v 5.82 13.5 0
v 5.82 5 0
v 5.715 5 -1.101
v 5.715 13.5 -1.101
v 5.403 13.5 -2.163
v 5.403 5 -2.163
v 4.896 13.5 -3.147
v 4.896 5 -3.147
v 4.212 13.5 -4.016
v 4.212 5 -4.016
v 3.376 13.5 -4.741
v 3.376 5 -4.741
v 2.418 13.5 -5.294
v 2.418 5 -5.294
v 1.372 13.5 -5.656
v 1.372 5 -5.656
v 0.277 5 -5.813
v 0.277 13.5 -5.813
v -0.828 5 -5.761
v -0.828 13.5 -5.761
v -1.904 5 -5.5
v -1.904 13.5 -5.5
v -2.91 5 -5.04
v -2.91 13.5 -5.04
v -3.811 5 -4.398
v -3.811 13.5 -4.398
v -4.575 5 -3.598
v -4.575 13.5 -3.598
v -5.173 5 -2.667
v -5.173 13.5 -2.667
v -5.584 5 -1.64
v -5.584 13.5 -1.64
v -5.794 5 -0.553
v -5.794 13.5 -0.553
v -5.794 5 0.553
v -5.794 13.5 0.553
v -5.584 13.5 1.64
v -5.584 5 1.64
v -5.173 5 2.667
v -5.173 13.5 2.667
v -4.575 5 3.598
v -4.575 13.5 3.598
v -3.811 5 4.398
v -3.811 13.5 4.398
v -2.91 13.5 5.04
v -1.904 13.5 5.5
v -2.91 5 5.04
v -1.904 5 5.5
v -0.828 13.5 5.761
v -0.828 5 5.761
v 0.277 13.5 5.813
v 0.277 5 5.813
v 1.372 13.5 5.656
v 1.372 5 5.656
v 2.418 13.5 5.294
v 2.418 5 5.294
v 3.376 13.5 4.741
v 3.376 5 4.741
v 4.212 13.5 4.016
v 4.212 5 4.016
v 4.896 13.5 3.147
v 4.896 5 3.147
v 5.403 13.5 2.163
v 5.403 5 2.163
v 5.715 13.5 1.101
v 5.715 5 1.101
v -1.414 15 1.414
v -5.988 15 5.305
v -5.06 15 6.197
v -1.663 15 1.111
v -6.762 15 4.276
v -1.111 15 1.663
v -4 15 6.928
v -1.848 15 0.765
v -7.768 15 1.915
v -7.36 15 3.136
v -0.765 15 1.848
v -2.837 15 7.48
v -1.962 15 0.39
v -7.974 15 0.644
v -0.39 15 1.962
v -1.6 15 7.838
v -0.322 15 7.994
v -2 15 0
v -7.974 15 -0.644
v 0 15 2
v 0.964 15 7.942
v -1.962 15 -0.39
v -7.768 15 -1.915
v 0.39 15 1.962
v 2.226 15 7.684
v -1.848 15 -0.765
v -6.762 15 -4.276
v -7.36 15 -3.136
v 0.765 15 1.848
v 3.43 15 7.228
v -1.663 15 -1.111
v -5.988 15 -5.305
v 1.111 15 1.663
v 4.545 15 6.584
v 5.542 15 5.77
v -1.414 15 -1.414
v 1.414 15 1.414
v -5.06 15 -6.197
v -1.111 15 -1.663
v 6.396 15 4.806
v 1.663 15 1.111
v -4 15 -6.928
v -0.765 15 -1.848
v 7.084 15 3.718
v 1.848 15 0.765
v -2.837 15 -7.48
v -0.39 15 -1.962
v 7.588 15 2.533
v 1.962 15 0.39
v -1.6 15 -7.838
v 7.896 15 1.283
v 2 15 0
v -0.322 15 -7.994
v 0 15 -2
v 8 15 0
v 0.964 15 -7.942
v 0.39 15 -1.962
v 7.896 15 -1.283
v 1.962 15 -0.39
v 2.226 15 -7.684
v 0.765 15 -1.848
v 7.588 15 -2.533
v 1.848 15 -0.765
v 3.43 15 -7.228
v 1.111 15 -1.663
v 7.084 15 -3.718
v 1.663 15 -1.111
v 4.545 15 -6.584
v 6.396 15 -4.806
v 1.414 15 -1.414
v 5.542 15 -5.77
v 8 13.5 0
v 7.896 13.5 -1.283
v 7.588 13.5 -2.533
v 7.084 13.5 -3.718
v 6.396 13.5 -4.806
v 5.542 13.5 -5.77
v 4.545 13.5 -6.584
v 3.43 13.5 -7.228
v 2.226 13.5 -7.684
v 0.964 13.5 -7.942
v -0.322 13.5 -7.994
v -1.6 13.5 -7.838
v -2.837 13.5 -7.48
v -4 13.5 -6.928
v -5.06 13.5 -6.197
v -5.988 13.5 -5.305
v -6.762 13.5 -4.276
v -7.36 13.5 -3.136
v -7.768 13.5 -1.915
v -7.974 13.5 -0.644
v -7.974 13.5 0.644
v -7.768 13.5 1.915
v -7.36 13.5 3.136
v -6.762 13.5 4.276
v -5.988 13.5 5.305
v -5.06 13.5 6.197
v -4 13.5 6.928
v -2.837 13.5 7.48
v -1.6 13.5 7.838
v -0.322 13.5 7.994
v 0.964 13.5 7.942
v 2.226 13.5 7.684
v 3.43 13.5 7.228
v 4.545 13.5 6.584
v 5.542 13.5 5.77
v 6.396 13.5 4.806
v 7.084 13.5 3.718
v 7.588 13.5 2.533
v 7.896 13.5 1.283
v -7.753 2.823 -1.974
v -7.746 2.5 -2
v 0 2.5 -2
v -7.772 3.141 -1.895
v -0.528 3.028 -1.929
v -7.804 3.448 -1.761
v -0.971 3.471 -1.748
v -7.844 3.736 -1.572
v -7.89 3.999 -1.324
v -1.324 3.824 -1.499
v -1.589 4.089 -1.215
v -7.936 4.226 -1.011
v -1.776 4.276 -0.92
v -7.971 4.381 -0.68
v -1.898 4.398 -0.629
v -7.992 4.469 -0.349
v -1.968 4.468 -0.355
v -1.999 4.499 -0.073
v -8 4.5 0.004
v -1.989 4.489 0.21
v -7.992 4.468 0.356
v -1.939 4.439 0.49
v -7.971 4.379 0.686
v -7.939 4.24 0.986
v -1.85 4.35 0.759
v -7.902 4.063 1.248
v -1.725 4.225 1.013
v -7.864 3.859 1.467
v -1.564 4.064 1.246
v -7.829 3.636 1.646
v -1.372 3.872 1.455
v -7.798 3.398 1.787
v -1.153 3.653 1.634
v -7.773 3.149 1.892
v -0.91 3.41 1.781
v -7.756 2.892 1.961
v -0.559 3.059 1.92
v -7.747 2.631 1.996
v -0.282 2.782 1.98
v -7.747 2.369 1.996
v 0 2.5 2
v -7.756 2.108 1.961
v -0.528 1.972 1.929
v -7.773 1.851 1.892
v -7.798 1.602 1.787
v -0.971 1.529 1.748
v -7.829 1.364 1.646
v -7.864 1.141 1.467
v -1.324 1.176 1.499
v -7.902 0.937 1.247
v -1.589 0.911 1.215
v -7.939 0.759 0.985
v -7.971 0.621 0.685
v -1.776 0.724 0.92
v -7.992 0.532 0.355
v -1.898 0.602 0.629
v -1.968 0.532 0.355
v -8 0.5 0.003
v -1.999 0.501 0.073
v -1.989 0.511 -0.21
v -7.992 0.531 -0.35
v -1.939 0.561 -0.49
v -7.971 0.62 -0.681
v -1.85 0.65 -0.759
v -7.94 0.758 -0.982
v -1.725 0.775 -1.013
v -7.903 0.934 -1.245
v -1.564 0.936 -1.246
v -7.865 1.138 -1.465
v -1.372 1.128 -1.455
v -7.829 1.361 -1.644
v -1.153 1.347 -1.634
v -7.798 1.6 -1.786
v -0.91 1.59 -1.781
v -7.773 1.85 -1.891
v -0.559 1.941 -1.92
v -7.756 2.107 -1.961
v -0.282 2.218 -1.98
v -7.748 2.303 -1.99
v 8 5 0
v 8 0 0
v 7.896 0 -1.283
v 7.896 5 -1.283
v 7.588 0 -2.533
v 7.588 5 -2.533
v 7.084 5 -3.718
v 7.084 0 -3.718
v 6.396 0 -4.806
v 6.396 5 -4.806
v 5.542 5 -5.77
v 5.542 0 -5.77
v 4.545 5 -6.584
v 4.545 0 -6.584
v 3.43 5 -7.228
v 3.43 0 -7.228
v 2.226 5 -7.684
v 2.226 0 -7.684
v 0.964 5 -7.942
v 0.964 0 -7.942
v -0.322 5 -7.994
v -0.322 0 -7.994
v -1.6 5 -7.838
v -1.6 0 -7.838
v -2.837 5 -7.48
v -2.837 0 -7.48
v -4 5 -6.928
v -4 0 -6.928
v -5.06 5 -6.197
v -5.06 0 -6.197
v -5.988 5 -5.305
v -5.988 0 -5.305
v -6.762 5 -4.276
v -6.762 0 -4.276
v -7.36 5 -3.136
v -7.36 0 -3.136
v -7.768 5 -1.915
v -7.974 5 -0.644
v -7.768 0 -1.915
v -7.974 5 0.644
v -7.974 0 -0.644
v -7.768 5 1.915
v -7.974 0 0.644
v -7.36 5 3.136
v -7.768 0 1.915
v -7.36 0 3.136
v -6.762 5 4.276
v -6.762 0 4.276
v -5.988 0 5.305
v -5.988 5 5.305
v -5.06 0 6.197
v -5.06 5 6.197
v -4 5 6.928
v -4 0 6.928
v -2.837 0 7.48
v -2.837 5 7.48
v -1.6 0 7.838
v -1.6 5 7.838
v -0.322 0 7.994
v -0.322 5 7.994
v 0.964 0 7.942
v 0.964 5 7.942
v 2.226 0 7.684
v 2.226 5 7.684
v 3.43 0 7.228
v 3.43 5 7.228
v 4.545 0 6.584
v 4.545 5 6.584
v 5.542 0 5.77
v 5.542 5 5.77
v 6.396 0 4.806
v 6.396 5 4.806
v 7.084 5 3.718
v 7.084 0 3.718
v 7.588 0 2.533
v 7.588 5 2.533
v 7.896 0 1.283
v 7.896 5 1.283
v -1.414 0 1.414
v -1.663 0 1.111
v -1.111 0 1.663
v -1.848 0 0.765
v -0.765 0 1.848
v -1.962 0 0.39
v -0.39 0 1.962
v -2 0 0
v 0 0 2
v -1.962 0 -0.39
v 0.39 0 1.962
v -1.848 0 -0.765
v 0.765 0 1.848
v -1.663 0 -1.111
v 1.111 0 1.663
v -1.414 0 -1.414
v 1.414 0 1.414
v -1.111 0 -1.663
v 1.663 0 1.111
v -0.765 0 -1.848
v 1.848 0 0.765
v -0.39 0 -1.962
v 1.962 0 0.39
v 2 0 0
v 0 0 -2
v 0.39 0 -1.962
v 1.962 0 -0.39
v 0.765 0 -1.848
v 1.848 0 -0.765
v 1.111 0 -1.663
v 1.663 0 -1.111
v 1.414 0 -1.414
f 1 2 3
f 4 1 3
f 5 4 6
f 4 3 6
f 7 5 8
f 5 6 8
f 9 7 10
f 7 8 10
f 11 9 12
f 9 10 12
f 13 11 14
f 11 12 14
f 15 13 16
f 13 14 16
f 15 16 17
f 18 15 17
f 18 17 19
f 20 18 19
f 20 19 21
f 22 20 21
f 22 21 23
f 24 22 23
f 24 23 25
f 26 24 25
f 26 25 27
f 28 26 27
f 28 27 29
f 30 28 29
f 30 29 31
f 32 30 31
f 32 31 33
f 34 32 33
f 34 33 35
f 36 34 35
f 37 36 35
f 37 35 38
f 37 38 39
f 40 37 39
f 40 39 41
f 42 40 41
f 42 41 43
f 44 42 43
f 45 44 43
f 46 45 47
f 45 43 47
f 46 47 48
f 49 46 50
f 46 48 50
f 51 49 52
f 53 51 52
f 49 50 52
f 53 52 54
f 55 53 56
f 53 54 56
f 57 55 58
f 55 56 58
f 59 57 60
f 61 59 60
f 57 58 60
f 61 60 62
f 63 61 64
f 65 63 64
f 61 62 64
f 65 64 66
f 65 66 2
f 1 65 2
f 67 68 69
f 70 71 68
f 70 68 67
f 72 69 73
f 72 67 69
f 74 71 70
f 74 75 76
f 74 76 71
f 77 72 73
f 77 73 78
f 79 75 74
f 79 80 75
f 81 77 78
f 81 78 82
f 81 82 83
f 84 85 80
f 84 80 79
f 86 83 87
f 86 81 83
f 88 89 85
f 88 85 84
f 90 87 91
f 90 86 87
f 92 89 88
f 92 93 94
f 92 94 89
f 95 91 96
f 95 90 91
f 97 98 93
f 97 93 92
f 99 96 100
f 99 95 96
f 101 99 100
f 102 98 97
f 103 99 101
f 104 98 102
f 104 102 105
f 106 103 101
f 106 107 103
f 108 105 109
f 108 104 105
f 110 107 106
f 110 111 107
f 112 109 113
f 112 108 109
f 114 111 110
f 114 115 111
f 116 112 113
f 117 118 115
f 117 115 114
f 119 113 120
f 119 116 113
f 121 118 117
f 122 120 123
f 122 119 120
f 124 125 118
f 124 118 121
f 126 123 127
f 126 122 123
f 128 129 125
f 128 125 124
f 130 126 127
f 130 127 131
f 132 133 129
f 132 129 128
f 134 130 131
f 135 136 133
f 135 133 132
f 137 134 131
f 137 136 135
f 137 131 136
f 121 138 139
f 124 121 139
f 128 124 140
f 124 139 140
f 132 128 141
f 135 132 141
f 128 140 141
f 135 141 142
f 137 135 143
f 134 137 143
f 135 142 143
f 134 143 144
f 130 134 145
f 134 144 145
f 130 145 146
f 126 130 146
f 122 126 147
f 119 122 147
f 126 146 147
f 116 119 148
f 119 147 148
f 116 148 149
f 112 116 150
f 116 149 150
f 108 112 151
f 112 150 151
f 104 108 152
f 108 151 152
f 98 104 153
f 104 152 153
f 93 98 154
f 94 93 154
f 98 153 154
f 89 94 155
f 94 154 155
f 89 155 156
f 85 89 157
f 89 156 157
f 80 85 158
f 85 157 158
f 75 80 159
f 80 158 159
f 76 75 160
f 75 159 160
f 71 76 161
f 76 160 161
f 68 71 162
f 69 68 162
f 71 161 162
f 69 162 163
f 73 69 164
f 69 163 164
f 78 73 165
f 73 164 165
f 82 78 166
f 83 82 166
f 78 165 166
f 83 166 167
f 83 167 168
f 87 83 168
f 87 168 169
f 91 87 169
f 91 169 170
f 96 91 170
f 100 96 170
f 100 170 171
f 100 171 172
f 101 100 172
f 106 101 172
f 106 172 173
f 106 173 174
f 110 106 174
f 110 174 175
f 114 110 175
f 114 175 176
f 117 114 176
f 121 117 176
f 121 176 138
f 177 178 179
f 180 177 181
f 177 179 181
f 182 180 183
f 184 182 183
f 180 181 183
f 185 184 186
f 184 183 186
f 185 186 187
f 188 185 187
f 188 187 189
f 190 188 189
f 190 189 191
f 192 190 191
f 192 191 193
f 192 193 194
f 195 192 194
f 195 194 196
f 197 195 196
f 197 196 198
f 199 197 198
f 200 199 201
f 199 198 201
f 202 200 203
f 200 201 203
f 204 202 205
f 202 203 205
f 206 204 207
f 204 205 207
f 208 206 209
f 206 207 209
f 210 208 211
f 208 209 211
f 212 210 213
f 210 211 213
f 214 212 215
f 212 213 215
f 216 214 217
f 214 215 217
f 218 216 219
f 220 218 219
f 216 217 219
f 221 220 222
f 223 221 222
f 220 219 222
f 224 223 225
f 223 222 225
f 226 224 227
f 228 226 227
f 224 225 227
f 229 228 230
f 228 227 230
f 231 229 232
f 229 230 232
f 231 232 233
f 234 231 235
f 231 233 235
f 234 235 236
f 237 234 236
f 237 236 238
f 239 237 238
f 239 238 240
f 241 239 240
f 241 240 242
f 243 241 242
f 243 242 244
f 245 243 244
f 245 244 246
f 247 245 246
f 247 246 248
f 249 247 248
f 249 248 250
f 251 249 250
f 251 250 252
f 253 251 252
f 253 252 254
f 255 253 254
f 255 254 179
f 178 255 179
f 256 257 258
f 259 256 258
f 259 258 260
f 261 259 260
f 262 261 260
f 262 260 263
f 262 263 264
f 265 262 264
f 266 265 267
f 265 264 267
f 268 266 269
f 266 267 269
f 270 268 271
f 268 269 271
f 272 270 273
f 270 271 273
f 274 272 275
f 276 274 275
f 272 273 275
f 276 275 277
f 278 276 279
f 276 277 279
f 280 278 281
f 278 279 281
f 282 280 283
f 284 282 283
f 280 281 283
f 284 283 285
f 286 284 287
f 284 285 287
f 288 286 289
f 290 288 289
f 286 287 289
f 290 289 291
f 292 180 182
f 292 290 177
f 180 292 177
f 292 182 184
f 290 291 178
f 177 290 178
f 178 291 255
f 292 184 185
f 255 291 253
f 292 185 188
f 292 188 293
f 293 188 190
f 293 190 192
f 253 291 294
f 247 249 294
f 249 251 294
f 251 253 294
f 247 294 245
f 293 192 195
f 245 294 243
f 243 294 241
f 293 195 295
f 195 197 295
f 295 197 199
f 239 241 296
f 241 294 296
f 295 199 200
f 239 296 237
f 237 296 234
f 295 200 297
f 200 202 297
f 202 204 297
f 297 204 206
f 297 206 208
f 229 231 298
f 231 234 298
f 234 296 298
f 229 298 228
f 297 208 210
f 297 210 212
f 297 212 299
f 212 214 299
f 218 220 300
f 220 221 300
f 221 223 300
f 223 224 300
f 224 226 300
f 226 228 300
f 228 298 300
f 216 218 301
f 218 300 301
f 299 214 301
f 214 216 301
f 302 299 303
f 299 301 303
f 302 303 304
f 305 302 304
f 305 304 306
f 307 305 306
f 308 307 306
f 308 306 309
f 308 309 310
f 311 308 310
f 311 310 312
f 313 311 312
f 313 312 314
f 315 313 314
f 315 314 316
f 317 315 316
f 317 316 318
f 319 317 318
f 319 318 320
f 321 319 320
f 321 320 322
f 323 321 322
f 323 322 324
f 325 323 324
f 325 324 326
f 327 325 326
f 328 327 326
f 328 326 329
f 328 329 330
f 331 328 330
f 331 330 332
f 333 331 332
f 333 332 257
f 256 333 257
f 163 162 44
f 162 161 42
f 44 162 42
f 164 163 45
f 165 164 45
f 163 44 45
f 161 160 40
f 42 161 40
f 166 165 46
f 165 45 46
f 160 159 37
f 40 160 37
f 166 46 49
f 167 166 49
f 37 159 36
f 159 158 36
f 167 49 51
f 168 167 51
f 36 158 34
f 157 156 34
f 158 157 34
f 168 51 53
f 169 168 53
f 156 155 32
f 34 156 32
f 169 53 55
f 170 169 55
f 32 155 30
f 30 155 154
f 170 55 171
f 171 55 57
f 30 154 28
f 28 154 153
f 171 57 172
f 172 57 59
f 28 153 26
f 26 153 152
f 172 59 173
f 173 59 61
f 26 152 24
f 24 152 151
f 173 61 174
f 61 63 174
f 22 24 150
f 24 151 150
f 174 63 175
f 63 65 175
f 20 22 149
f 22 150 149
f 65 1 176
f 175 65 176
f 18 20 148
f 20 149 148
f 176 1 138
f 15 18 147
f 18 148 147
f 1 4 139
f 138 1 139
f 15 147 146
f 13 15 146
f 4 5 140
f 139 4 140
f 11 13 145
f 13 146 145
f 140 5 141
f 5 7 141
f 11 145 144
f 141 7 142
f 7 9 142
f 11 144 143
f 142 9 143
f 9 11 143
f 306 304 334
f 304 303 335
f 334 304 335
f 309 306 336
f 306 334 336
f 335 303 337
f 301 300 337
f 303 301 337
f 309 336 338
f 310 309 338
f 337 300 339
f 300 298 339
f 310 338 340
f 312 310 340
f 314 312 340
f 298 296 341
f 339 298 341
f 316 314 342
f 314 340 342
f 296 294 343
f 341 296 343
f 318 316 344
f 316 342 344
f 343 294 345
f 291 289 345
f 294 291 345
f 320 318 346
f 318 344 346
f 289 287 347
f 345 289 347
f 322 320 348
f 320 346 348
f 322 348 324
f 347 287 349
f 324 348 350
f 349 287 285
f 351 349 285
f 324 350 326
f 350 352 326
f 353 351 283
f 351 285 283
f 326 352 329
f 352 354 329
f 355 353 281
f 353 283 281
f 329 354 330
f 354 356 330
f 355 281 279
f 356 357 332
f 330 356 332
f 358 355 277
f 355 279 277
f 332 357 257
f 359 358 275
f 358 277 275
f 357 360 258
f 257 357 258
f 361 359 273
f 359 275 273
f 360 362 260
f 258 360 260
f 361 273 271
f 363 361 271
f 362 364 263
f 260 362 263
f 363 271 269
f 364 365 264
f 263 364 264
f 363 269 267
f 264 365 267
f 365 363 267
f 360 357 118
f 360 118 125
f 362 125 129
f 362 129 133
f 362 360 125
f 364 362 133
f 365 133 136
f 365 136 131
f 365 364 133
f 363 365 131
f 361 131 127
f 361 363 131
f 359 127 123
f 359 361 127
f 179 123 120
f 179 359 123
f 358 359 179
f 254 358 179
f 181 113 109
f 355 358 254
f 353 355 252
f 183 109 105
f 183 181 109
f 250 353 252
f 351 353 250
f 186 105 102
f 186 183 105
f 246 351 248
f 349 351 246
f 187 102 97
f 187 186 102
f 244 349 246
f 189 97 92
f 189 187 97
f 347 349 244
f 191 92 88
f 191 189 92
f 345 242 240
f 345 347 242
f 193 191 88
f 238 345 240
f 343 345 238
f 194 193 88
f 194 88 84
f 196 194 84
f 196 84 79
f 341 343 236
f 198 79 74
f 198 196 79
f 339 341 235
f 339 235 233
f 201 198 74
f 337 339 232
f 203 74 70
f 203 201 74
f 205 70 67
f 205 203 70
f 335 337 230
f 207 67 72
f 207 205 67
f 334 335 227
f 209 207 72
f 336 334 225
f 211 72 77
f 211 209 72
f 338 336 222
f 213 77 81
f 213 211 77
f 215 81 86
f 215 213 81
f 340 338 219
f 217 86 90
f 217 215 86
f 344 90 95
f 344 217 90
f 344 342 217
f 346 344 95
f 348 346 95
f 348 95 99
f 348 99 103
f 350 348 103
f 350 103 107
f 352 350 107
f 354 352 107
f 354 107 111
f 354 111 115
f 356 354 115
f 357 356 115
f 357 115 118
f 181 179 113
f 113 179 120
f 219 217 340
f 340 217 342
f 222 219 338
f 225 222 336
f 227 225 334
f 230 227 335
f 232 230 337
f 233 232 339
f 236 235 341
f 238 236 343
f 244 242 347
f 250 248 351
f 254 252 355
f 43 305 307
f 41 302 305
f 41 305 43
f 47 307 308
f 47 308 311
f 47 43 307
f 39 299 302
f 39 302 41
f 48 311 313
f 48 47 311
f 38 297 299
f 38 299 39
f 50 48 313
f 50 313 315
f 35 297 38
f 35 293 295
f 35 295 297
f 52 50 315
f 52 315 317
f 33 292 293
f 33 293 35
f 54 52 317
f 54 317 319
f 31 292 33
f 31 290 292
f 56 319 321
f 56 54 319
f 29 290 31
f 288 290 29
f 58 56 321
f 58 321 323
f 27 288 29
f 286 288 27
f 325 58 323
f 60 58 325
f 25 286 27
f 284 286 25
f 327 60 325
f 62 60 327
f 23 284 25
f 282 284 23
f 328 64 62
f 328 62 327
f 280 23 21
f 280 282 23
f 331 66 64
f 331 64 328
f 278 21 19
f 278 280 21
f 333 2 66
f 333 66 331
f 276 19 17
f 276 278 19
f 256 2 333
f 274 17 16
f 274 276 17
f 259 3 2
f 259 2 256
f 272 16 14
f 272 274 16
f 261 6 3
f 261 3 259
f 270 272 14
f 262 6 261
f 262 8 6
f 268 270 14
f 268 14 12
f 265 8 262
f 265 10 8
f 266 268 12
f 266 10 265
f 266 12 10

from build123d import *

# Parameters (mm, degrees)
CROQUIS1_R              = 8
CROQUIS1_R_2            = 2
SALIENTE_EXTRUIR1_DEPTH = 5
CROQUIS1_3_R            = 5.82
CROQUIS1_3_R_2          = 2
SALIENTE_EXTRUIR2_DEPTH = 13.5
CROQUIS2_R              = 8
CROQUIS2_R_2            = 2
SALIENTE_EXTRUIR7_DEPTH = 1.5
CORTAR_EXTRUIR1_REACH   = 20.788
CROQUIS3_R              = 2


with BuildPart() as part:
    # Croquis1 → Saliente-Extruir1 (new body)
    with BuildSketch(Plane(origin=(0, 0, 0), x_dir=(1, 0, 0), z_dir=(0, 1, 0))):
        Circle(CROQUIS1_R)
        Circle(CROQUIS1_R_2, mode=Mode.SUBTRACT)
    extrude(amount=SALIENTE_EXTRUIR1_DEPTH)

    # Croquis1<3> → Saliente-Extruir2 (add)
    with BuildSketch(Plane(origin=(0, 0, 0), x_dir=(1, 0, 0), z_dir=(0, 1, 0))):
        Circle(CROQUIS1_3_R)
        Circle(CROQUIS1_3_R_2, mode=Mode.SUBTRACT)
    extrude(amount=SALIENTE_EXTRUIR2_DEPTH)

    # Croquis2 → Saliente-Extruir7 (add)
    with BuildSketch(Plane(origin=(0, 13.5, 0), x_dir=(1, 0, 0), z_dir=(0, 1, 0))):
        Circle(CROQUIS2_R)
        Circle(CROQUIS2_R_2, mode=Mode.SUBTRACT)
    extrude(amount=SALIENTE_EXTRUIR7_DEPTH)

    # Croquis3 → Cortar-Extruir1 (cut, up to next)
    with BuildSketch(Plane(origin=(0, 0, 0), x_dir=(0, 0, -1), z_dir=(1, 0, 0)), mode=Mode.PRIVATE) as cortar_extruir1_sk1:
        with Locations((0, 2.5)):
            Circle(CROQUIS3_R)
    cortar_extruir1_tool1 = extrude(cortar_extruir1_sk1.sketch, amount=-CORTAR_EXTRUIR1_REACH, mode=Mode.PRIVATE) & part.part
    add(cortar_extruir1_tool1.solids().sort_by_distance((0, 2.5, 0))[0], mode=Mode.SUBTRACT)


solid = part.part
